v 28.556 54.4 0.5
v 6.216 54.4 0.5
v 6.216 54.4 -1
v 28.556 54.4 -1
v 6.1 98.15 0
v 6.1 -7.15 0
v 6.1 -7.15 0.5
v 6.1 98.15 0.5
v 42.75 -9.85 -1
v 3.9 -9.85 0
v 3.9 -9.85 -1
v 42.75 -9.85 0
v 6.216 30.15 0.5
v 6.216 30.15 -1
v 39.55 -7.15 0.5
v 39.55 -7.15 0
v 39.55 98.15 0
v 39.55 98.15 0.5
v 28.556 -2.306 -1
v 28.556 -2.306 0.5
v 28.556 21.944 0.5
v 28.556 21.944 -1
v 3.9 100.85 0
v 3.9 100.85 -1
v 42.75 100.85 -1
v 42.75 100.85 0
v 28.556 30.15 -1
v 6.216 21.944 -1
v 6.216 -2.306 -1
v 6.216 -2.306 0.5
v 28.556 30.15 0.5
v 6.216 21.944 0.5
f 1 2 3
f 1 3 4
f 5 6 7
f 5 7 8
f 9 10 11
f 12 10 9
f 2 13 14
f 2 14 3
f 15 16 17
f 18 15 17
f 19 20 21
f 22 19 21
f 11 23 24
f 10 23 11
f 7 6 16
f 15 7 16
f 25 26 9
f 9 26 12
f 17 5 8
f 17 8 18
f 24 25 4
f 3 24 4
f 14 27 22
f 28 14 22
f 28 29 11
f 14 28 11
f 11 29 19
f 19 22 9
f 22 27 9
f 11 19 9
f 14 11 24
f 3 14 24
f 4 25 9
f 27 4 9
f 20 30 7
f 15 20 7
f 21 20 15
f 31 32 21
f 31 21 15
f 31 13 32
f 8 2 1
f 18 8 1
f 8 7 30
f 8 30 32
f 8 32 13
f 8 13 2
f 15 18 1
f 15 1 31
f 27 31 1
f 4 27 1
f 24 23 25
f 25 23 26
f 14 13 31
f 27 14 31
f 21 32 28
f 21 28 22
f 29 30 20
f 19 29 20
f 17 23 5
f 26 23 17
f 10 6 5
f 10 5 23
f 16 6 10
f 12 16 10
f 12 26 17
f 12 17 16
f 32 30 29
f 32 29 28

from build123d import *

# Parameters (mm, degrees)
SKETCH_1_W          = 110.7
SKETCH_1_H          = 38.85
EXTRUDE_1_DEPTH     = 1
SKETCH_2_W          = 33.45
SKETCH_2_H          = 105.3
EXTRUDE_2_DEPTH     = 0.5
SKETCH_3_W          = 22.339400882
SKETCH_3_H          = 24.25
CUT_EXTRUDE_1_DEPTH = 2


with BuildPart() as part:
    # Эскиз1 → Бобышка-Вытянуть1 (new body)
    with BuildSketch(Plane(origin=(0.5, 0, 0), x_dir=(0, -1, 0), z_dir=(0, 0, 1))):
        with Locations((-45.5, 22.825)):
            Rectangle(SKETCH_1_W, SKETCH_1_H)
    extrude(amount=-EXTRUDE_1_DEPTH)

    # Эскиз2 → Бобышка-Вытянуть2 (add)
    with BuildSketch(Plane.XY):
        with Locations((22.825, 45.5)):
            Rectangle(SKETCH_2_W, SKETCH_2_H)
    extrude(amount=EXTRUDE_2_DEPTH)

    # Эскиз3 → Вырез-Вытянуть1 (cut)
    with BuildSketch(Plane.XY.offset(0.5)):
        with Locations((17.385892666, 42.275)):
            Rectangle(SKETCH_3_W, SKETCH_3_H)
        with Locations((17.385892666, 9.819443695)):
            Rectangle(SKETCH_3_W, SKETCH_3_H)
    extrude(amount=-CUT_EXTRUDE_1_DEPTH, mode=Mode.SUBTRACT)


solid = part.part
